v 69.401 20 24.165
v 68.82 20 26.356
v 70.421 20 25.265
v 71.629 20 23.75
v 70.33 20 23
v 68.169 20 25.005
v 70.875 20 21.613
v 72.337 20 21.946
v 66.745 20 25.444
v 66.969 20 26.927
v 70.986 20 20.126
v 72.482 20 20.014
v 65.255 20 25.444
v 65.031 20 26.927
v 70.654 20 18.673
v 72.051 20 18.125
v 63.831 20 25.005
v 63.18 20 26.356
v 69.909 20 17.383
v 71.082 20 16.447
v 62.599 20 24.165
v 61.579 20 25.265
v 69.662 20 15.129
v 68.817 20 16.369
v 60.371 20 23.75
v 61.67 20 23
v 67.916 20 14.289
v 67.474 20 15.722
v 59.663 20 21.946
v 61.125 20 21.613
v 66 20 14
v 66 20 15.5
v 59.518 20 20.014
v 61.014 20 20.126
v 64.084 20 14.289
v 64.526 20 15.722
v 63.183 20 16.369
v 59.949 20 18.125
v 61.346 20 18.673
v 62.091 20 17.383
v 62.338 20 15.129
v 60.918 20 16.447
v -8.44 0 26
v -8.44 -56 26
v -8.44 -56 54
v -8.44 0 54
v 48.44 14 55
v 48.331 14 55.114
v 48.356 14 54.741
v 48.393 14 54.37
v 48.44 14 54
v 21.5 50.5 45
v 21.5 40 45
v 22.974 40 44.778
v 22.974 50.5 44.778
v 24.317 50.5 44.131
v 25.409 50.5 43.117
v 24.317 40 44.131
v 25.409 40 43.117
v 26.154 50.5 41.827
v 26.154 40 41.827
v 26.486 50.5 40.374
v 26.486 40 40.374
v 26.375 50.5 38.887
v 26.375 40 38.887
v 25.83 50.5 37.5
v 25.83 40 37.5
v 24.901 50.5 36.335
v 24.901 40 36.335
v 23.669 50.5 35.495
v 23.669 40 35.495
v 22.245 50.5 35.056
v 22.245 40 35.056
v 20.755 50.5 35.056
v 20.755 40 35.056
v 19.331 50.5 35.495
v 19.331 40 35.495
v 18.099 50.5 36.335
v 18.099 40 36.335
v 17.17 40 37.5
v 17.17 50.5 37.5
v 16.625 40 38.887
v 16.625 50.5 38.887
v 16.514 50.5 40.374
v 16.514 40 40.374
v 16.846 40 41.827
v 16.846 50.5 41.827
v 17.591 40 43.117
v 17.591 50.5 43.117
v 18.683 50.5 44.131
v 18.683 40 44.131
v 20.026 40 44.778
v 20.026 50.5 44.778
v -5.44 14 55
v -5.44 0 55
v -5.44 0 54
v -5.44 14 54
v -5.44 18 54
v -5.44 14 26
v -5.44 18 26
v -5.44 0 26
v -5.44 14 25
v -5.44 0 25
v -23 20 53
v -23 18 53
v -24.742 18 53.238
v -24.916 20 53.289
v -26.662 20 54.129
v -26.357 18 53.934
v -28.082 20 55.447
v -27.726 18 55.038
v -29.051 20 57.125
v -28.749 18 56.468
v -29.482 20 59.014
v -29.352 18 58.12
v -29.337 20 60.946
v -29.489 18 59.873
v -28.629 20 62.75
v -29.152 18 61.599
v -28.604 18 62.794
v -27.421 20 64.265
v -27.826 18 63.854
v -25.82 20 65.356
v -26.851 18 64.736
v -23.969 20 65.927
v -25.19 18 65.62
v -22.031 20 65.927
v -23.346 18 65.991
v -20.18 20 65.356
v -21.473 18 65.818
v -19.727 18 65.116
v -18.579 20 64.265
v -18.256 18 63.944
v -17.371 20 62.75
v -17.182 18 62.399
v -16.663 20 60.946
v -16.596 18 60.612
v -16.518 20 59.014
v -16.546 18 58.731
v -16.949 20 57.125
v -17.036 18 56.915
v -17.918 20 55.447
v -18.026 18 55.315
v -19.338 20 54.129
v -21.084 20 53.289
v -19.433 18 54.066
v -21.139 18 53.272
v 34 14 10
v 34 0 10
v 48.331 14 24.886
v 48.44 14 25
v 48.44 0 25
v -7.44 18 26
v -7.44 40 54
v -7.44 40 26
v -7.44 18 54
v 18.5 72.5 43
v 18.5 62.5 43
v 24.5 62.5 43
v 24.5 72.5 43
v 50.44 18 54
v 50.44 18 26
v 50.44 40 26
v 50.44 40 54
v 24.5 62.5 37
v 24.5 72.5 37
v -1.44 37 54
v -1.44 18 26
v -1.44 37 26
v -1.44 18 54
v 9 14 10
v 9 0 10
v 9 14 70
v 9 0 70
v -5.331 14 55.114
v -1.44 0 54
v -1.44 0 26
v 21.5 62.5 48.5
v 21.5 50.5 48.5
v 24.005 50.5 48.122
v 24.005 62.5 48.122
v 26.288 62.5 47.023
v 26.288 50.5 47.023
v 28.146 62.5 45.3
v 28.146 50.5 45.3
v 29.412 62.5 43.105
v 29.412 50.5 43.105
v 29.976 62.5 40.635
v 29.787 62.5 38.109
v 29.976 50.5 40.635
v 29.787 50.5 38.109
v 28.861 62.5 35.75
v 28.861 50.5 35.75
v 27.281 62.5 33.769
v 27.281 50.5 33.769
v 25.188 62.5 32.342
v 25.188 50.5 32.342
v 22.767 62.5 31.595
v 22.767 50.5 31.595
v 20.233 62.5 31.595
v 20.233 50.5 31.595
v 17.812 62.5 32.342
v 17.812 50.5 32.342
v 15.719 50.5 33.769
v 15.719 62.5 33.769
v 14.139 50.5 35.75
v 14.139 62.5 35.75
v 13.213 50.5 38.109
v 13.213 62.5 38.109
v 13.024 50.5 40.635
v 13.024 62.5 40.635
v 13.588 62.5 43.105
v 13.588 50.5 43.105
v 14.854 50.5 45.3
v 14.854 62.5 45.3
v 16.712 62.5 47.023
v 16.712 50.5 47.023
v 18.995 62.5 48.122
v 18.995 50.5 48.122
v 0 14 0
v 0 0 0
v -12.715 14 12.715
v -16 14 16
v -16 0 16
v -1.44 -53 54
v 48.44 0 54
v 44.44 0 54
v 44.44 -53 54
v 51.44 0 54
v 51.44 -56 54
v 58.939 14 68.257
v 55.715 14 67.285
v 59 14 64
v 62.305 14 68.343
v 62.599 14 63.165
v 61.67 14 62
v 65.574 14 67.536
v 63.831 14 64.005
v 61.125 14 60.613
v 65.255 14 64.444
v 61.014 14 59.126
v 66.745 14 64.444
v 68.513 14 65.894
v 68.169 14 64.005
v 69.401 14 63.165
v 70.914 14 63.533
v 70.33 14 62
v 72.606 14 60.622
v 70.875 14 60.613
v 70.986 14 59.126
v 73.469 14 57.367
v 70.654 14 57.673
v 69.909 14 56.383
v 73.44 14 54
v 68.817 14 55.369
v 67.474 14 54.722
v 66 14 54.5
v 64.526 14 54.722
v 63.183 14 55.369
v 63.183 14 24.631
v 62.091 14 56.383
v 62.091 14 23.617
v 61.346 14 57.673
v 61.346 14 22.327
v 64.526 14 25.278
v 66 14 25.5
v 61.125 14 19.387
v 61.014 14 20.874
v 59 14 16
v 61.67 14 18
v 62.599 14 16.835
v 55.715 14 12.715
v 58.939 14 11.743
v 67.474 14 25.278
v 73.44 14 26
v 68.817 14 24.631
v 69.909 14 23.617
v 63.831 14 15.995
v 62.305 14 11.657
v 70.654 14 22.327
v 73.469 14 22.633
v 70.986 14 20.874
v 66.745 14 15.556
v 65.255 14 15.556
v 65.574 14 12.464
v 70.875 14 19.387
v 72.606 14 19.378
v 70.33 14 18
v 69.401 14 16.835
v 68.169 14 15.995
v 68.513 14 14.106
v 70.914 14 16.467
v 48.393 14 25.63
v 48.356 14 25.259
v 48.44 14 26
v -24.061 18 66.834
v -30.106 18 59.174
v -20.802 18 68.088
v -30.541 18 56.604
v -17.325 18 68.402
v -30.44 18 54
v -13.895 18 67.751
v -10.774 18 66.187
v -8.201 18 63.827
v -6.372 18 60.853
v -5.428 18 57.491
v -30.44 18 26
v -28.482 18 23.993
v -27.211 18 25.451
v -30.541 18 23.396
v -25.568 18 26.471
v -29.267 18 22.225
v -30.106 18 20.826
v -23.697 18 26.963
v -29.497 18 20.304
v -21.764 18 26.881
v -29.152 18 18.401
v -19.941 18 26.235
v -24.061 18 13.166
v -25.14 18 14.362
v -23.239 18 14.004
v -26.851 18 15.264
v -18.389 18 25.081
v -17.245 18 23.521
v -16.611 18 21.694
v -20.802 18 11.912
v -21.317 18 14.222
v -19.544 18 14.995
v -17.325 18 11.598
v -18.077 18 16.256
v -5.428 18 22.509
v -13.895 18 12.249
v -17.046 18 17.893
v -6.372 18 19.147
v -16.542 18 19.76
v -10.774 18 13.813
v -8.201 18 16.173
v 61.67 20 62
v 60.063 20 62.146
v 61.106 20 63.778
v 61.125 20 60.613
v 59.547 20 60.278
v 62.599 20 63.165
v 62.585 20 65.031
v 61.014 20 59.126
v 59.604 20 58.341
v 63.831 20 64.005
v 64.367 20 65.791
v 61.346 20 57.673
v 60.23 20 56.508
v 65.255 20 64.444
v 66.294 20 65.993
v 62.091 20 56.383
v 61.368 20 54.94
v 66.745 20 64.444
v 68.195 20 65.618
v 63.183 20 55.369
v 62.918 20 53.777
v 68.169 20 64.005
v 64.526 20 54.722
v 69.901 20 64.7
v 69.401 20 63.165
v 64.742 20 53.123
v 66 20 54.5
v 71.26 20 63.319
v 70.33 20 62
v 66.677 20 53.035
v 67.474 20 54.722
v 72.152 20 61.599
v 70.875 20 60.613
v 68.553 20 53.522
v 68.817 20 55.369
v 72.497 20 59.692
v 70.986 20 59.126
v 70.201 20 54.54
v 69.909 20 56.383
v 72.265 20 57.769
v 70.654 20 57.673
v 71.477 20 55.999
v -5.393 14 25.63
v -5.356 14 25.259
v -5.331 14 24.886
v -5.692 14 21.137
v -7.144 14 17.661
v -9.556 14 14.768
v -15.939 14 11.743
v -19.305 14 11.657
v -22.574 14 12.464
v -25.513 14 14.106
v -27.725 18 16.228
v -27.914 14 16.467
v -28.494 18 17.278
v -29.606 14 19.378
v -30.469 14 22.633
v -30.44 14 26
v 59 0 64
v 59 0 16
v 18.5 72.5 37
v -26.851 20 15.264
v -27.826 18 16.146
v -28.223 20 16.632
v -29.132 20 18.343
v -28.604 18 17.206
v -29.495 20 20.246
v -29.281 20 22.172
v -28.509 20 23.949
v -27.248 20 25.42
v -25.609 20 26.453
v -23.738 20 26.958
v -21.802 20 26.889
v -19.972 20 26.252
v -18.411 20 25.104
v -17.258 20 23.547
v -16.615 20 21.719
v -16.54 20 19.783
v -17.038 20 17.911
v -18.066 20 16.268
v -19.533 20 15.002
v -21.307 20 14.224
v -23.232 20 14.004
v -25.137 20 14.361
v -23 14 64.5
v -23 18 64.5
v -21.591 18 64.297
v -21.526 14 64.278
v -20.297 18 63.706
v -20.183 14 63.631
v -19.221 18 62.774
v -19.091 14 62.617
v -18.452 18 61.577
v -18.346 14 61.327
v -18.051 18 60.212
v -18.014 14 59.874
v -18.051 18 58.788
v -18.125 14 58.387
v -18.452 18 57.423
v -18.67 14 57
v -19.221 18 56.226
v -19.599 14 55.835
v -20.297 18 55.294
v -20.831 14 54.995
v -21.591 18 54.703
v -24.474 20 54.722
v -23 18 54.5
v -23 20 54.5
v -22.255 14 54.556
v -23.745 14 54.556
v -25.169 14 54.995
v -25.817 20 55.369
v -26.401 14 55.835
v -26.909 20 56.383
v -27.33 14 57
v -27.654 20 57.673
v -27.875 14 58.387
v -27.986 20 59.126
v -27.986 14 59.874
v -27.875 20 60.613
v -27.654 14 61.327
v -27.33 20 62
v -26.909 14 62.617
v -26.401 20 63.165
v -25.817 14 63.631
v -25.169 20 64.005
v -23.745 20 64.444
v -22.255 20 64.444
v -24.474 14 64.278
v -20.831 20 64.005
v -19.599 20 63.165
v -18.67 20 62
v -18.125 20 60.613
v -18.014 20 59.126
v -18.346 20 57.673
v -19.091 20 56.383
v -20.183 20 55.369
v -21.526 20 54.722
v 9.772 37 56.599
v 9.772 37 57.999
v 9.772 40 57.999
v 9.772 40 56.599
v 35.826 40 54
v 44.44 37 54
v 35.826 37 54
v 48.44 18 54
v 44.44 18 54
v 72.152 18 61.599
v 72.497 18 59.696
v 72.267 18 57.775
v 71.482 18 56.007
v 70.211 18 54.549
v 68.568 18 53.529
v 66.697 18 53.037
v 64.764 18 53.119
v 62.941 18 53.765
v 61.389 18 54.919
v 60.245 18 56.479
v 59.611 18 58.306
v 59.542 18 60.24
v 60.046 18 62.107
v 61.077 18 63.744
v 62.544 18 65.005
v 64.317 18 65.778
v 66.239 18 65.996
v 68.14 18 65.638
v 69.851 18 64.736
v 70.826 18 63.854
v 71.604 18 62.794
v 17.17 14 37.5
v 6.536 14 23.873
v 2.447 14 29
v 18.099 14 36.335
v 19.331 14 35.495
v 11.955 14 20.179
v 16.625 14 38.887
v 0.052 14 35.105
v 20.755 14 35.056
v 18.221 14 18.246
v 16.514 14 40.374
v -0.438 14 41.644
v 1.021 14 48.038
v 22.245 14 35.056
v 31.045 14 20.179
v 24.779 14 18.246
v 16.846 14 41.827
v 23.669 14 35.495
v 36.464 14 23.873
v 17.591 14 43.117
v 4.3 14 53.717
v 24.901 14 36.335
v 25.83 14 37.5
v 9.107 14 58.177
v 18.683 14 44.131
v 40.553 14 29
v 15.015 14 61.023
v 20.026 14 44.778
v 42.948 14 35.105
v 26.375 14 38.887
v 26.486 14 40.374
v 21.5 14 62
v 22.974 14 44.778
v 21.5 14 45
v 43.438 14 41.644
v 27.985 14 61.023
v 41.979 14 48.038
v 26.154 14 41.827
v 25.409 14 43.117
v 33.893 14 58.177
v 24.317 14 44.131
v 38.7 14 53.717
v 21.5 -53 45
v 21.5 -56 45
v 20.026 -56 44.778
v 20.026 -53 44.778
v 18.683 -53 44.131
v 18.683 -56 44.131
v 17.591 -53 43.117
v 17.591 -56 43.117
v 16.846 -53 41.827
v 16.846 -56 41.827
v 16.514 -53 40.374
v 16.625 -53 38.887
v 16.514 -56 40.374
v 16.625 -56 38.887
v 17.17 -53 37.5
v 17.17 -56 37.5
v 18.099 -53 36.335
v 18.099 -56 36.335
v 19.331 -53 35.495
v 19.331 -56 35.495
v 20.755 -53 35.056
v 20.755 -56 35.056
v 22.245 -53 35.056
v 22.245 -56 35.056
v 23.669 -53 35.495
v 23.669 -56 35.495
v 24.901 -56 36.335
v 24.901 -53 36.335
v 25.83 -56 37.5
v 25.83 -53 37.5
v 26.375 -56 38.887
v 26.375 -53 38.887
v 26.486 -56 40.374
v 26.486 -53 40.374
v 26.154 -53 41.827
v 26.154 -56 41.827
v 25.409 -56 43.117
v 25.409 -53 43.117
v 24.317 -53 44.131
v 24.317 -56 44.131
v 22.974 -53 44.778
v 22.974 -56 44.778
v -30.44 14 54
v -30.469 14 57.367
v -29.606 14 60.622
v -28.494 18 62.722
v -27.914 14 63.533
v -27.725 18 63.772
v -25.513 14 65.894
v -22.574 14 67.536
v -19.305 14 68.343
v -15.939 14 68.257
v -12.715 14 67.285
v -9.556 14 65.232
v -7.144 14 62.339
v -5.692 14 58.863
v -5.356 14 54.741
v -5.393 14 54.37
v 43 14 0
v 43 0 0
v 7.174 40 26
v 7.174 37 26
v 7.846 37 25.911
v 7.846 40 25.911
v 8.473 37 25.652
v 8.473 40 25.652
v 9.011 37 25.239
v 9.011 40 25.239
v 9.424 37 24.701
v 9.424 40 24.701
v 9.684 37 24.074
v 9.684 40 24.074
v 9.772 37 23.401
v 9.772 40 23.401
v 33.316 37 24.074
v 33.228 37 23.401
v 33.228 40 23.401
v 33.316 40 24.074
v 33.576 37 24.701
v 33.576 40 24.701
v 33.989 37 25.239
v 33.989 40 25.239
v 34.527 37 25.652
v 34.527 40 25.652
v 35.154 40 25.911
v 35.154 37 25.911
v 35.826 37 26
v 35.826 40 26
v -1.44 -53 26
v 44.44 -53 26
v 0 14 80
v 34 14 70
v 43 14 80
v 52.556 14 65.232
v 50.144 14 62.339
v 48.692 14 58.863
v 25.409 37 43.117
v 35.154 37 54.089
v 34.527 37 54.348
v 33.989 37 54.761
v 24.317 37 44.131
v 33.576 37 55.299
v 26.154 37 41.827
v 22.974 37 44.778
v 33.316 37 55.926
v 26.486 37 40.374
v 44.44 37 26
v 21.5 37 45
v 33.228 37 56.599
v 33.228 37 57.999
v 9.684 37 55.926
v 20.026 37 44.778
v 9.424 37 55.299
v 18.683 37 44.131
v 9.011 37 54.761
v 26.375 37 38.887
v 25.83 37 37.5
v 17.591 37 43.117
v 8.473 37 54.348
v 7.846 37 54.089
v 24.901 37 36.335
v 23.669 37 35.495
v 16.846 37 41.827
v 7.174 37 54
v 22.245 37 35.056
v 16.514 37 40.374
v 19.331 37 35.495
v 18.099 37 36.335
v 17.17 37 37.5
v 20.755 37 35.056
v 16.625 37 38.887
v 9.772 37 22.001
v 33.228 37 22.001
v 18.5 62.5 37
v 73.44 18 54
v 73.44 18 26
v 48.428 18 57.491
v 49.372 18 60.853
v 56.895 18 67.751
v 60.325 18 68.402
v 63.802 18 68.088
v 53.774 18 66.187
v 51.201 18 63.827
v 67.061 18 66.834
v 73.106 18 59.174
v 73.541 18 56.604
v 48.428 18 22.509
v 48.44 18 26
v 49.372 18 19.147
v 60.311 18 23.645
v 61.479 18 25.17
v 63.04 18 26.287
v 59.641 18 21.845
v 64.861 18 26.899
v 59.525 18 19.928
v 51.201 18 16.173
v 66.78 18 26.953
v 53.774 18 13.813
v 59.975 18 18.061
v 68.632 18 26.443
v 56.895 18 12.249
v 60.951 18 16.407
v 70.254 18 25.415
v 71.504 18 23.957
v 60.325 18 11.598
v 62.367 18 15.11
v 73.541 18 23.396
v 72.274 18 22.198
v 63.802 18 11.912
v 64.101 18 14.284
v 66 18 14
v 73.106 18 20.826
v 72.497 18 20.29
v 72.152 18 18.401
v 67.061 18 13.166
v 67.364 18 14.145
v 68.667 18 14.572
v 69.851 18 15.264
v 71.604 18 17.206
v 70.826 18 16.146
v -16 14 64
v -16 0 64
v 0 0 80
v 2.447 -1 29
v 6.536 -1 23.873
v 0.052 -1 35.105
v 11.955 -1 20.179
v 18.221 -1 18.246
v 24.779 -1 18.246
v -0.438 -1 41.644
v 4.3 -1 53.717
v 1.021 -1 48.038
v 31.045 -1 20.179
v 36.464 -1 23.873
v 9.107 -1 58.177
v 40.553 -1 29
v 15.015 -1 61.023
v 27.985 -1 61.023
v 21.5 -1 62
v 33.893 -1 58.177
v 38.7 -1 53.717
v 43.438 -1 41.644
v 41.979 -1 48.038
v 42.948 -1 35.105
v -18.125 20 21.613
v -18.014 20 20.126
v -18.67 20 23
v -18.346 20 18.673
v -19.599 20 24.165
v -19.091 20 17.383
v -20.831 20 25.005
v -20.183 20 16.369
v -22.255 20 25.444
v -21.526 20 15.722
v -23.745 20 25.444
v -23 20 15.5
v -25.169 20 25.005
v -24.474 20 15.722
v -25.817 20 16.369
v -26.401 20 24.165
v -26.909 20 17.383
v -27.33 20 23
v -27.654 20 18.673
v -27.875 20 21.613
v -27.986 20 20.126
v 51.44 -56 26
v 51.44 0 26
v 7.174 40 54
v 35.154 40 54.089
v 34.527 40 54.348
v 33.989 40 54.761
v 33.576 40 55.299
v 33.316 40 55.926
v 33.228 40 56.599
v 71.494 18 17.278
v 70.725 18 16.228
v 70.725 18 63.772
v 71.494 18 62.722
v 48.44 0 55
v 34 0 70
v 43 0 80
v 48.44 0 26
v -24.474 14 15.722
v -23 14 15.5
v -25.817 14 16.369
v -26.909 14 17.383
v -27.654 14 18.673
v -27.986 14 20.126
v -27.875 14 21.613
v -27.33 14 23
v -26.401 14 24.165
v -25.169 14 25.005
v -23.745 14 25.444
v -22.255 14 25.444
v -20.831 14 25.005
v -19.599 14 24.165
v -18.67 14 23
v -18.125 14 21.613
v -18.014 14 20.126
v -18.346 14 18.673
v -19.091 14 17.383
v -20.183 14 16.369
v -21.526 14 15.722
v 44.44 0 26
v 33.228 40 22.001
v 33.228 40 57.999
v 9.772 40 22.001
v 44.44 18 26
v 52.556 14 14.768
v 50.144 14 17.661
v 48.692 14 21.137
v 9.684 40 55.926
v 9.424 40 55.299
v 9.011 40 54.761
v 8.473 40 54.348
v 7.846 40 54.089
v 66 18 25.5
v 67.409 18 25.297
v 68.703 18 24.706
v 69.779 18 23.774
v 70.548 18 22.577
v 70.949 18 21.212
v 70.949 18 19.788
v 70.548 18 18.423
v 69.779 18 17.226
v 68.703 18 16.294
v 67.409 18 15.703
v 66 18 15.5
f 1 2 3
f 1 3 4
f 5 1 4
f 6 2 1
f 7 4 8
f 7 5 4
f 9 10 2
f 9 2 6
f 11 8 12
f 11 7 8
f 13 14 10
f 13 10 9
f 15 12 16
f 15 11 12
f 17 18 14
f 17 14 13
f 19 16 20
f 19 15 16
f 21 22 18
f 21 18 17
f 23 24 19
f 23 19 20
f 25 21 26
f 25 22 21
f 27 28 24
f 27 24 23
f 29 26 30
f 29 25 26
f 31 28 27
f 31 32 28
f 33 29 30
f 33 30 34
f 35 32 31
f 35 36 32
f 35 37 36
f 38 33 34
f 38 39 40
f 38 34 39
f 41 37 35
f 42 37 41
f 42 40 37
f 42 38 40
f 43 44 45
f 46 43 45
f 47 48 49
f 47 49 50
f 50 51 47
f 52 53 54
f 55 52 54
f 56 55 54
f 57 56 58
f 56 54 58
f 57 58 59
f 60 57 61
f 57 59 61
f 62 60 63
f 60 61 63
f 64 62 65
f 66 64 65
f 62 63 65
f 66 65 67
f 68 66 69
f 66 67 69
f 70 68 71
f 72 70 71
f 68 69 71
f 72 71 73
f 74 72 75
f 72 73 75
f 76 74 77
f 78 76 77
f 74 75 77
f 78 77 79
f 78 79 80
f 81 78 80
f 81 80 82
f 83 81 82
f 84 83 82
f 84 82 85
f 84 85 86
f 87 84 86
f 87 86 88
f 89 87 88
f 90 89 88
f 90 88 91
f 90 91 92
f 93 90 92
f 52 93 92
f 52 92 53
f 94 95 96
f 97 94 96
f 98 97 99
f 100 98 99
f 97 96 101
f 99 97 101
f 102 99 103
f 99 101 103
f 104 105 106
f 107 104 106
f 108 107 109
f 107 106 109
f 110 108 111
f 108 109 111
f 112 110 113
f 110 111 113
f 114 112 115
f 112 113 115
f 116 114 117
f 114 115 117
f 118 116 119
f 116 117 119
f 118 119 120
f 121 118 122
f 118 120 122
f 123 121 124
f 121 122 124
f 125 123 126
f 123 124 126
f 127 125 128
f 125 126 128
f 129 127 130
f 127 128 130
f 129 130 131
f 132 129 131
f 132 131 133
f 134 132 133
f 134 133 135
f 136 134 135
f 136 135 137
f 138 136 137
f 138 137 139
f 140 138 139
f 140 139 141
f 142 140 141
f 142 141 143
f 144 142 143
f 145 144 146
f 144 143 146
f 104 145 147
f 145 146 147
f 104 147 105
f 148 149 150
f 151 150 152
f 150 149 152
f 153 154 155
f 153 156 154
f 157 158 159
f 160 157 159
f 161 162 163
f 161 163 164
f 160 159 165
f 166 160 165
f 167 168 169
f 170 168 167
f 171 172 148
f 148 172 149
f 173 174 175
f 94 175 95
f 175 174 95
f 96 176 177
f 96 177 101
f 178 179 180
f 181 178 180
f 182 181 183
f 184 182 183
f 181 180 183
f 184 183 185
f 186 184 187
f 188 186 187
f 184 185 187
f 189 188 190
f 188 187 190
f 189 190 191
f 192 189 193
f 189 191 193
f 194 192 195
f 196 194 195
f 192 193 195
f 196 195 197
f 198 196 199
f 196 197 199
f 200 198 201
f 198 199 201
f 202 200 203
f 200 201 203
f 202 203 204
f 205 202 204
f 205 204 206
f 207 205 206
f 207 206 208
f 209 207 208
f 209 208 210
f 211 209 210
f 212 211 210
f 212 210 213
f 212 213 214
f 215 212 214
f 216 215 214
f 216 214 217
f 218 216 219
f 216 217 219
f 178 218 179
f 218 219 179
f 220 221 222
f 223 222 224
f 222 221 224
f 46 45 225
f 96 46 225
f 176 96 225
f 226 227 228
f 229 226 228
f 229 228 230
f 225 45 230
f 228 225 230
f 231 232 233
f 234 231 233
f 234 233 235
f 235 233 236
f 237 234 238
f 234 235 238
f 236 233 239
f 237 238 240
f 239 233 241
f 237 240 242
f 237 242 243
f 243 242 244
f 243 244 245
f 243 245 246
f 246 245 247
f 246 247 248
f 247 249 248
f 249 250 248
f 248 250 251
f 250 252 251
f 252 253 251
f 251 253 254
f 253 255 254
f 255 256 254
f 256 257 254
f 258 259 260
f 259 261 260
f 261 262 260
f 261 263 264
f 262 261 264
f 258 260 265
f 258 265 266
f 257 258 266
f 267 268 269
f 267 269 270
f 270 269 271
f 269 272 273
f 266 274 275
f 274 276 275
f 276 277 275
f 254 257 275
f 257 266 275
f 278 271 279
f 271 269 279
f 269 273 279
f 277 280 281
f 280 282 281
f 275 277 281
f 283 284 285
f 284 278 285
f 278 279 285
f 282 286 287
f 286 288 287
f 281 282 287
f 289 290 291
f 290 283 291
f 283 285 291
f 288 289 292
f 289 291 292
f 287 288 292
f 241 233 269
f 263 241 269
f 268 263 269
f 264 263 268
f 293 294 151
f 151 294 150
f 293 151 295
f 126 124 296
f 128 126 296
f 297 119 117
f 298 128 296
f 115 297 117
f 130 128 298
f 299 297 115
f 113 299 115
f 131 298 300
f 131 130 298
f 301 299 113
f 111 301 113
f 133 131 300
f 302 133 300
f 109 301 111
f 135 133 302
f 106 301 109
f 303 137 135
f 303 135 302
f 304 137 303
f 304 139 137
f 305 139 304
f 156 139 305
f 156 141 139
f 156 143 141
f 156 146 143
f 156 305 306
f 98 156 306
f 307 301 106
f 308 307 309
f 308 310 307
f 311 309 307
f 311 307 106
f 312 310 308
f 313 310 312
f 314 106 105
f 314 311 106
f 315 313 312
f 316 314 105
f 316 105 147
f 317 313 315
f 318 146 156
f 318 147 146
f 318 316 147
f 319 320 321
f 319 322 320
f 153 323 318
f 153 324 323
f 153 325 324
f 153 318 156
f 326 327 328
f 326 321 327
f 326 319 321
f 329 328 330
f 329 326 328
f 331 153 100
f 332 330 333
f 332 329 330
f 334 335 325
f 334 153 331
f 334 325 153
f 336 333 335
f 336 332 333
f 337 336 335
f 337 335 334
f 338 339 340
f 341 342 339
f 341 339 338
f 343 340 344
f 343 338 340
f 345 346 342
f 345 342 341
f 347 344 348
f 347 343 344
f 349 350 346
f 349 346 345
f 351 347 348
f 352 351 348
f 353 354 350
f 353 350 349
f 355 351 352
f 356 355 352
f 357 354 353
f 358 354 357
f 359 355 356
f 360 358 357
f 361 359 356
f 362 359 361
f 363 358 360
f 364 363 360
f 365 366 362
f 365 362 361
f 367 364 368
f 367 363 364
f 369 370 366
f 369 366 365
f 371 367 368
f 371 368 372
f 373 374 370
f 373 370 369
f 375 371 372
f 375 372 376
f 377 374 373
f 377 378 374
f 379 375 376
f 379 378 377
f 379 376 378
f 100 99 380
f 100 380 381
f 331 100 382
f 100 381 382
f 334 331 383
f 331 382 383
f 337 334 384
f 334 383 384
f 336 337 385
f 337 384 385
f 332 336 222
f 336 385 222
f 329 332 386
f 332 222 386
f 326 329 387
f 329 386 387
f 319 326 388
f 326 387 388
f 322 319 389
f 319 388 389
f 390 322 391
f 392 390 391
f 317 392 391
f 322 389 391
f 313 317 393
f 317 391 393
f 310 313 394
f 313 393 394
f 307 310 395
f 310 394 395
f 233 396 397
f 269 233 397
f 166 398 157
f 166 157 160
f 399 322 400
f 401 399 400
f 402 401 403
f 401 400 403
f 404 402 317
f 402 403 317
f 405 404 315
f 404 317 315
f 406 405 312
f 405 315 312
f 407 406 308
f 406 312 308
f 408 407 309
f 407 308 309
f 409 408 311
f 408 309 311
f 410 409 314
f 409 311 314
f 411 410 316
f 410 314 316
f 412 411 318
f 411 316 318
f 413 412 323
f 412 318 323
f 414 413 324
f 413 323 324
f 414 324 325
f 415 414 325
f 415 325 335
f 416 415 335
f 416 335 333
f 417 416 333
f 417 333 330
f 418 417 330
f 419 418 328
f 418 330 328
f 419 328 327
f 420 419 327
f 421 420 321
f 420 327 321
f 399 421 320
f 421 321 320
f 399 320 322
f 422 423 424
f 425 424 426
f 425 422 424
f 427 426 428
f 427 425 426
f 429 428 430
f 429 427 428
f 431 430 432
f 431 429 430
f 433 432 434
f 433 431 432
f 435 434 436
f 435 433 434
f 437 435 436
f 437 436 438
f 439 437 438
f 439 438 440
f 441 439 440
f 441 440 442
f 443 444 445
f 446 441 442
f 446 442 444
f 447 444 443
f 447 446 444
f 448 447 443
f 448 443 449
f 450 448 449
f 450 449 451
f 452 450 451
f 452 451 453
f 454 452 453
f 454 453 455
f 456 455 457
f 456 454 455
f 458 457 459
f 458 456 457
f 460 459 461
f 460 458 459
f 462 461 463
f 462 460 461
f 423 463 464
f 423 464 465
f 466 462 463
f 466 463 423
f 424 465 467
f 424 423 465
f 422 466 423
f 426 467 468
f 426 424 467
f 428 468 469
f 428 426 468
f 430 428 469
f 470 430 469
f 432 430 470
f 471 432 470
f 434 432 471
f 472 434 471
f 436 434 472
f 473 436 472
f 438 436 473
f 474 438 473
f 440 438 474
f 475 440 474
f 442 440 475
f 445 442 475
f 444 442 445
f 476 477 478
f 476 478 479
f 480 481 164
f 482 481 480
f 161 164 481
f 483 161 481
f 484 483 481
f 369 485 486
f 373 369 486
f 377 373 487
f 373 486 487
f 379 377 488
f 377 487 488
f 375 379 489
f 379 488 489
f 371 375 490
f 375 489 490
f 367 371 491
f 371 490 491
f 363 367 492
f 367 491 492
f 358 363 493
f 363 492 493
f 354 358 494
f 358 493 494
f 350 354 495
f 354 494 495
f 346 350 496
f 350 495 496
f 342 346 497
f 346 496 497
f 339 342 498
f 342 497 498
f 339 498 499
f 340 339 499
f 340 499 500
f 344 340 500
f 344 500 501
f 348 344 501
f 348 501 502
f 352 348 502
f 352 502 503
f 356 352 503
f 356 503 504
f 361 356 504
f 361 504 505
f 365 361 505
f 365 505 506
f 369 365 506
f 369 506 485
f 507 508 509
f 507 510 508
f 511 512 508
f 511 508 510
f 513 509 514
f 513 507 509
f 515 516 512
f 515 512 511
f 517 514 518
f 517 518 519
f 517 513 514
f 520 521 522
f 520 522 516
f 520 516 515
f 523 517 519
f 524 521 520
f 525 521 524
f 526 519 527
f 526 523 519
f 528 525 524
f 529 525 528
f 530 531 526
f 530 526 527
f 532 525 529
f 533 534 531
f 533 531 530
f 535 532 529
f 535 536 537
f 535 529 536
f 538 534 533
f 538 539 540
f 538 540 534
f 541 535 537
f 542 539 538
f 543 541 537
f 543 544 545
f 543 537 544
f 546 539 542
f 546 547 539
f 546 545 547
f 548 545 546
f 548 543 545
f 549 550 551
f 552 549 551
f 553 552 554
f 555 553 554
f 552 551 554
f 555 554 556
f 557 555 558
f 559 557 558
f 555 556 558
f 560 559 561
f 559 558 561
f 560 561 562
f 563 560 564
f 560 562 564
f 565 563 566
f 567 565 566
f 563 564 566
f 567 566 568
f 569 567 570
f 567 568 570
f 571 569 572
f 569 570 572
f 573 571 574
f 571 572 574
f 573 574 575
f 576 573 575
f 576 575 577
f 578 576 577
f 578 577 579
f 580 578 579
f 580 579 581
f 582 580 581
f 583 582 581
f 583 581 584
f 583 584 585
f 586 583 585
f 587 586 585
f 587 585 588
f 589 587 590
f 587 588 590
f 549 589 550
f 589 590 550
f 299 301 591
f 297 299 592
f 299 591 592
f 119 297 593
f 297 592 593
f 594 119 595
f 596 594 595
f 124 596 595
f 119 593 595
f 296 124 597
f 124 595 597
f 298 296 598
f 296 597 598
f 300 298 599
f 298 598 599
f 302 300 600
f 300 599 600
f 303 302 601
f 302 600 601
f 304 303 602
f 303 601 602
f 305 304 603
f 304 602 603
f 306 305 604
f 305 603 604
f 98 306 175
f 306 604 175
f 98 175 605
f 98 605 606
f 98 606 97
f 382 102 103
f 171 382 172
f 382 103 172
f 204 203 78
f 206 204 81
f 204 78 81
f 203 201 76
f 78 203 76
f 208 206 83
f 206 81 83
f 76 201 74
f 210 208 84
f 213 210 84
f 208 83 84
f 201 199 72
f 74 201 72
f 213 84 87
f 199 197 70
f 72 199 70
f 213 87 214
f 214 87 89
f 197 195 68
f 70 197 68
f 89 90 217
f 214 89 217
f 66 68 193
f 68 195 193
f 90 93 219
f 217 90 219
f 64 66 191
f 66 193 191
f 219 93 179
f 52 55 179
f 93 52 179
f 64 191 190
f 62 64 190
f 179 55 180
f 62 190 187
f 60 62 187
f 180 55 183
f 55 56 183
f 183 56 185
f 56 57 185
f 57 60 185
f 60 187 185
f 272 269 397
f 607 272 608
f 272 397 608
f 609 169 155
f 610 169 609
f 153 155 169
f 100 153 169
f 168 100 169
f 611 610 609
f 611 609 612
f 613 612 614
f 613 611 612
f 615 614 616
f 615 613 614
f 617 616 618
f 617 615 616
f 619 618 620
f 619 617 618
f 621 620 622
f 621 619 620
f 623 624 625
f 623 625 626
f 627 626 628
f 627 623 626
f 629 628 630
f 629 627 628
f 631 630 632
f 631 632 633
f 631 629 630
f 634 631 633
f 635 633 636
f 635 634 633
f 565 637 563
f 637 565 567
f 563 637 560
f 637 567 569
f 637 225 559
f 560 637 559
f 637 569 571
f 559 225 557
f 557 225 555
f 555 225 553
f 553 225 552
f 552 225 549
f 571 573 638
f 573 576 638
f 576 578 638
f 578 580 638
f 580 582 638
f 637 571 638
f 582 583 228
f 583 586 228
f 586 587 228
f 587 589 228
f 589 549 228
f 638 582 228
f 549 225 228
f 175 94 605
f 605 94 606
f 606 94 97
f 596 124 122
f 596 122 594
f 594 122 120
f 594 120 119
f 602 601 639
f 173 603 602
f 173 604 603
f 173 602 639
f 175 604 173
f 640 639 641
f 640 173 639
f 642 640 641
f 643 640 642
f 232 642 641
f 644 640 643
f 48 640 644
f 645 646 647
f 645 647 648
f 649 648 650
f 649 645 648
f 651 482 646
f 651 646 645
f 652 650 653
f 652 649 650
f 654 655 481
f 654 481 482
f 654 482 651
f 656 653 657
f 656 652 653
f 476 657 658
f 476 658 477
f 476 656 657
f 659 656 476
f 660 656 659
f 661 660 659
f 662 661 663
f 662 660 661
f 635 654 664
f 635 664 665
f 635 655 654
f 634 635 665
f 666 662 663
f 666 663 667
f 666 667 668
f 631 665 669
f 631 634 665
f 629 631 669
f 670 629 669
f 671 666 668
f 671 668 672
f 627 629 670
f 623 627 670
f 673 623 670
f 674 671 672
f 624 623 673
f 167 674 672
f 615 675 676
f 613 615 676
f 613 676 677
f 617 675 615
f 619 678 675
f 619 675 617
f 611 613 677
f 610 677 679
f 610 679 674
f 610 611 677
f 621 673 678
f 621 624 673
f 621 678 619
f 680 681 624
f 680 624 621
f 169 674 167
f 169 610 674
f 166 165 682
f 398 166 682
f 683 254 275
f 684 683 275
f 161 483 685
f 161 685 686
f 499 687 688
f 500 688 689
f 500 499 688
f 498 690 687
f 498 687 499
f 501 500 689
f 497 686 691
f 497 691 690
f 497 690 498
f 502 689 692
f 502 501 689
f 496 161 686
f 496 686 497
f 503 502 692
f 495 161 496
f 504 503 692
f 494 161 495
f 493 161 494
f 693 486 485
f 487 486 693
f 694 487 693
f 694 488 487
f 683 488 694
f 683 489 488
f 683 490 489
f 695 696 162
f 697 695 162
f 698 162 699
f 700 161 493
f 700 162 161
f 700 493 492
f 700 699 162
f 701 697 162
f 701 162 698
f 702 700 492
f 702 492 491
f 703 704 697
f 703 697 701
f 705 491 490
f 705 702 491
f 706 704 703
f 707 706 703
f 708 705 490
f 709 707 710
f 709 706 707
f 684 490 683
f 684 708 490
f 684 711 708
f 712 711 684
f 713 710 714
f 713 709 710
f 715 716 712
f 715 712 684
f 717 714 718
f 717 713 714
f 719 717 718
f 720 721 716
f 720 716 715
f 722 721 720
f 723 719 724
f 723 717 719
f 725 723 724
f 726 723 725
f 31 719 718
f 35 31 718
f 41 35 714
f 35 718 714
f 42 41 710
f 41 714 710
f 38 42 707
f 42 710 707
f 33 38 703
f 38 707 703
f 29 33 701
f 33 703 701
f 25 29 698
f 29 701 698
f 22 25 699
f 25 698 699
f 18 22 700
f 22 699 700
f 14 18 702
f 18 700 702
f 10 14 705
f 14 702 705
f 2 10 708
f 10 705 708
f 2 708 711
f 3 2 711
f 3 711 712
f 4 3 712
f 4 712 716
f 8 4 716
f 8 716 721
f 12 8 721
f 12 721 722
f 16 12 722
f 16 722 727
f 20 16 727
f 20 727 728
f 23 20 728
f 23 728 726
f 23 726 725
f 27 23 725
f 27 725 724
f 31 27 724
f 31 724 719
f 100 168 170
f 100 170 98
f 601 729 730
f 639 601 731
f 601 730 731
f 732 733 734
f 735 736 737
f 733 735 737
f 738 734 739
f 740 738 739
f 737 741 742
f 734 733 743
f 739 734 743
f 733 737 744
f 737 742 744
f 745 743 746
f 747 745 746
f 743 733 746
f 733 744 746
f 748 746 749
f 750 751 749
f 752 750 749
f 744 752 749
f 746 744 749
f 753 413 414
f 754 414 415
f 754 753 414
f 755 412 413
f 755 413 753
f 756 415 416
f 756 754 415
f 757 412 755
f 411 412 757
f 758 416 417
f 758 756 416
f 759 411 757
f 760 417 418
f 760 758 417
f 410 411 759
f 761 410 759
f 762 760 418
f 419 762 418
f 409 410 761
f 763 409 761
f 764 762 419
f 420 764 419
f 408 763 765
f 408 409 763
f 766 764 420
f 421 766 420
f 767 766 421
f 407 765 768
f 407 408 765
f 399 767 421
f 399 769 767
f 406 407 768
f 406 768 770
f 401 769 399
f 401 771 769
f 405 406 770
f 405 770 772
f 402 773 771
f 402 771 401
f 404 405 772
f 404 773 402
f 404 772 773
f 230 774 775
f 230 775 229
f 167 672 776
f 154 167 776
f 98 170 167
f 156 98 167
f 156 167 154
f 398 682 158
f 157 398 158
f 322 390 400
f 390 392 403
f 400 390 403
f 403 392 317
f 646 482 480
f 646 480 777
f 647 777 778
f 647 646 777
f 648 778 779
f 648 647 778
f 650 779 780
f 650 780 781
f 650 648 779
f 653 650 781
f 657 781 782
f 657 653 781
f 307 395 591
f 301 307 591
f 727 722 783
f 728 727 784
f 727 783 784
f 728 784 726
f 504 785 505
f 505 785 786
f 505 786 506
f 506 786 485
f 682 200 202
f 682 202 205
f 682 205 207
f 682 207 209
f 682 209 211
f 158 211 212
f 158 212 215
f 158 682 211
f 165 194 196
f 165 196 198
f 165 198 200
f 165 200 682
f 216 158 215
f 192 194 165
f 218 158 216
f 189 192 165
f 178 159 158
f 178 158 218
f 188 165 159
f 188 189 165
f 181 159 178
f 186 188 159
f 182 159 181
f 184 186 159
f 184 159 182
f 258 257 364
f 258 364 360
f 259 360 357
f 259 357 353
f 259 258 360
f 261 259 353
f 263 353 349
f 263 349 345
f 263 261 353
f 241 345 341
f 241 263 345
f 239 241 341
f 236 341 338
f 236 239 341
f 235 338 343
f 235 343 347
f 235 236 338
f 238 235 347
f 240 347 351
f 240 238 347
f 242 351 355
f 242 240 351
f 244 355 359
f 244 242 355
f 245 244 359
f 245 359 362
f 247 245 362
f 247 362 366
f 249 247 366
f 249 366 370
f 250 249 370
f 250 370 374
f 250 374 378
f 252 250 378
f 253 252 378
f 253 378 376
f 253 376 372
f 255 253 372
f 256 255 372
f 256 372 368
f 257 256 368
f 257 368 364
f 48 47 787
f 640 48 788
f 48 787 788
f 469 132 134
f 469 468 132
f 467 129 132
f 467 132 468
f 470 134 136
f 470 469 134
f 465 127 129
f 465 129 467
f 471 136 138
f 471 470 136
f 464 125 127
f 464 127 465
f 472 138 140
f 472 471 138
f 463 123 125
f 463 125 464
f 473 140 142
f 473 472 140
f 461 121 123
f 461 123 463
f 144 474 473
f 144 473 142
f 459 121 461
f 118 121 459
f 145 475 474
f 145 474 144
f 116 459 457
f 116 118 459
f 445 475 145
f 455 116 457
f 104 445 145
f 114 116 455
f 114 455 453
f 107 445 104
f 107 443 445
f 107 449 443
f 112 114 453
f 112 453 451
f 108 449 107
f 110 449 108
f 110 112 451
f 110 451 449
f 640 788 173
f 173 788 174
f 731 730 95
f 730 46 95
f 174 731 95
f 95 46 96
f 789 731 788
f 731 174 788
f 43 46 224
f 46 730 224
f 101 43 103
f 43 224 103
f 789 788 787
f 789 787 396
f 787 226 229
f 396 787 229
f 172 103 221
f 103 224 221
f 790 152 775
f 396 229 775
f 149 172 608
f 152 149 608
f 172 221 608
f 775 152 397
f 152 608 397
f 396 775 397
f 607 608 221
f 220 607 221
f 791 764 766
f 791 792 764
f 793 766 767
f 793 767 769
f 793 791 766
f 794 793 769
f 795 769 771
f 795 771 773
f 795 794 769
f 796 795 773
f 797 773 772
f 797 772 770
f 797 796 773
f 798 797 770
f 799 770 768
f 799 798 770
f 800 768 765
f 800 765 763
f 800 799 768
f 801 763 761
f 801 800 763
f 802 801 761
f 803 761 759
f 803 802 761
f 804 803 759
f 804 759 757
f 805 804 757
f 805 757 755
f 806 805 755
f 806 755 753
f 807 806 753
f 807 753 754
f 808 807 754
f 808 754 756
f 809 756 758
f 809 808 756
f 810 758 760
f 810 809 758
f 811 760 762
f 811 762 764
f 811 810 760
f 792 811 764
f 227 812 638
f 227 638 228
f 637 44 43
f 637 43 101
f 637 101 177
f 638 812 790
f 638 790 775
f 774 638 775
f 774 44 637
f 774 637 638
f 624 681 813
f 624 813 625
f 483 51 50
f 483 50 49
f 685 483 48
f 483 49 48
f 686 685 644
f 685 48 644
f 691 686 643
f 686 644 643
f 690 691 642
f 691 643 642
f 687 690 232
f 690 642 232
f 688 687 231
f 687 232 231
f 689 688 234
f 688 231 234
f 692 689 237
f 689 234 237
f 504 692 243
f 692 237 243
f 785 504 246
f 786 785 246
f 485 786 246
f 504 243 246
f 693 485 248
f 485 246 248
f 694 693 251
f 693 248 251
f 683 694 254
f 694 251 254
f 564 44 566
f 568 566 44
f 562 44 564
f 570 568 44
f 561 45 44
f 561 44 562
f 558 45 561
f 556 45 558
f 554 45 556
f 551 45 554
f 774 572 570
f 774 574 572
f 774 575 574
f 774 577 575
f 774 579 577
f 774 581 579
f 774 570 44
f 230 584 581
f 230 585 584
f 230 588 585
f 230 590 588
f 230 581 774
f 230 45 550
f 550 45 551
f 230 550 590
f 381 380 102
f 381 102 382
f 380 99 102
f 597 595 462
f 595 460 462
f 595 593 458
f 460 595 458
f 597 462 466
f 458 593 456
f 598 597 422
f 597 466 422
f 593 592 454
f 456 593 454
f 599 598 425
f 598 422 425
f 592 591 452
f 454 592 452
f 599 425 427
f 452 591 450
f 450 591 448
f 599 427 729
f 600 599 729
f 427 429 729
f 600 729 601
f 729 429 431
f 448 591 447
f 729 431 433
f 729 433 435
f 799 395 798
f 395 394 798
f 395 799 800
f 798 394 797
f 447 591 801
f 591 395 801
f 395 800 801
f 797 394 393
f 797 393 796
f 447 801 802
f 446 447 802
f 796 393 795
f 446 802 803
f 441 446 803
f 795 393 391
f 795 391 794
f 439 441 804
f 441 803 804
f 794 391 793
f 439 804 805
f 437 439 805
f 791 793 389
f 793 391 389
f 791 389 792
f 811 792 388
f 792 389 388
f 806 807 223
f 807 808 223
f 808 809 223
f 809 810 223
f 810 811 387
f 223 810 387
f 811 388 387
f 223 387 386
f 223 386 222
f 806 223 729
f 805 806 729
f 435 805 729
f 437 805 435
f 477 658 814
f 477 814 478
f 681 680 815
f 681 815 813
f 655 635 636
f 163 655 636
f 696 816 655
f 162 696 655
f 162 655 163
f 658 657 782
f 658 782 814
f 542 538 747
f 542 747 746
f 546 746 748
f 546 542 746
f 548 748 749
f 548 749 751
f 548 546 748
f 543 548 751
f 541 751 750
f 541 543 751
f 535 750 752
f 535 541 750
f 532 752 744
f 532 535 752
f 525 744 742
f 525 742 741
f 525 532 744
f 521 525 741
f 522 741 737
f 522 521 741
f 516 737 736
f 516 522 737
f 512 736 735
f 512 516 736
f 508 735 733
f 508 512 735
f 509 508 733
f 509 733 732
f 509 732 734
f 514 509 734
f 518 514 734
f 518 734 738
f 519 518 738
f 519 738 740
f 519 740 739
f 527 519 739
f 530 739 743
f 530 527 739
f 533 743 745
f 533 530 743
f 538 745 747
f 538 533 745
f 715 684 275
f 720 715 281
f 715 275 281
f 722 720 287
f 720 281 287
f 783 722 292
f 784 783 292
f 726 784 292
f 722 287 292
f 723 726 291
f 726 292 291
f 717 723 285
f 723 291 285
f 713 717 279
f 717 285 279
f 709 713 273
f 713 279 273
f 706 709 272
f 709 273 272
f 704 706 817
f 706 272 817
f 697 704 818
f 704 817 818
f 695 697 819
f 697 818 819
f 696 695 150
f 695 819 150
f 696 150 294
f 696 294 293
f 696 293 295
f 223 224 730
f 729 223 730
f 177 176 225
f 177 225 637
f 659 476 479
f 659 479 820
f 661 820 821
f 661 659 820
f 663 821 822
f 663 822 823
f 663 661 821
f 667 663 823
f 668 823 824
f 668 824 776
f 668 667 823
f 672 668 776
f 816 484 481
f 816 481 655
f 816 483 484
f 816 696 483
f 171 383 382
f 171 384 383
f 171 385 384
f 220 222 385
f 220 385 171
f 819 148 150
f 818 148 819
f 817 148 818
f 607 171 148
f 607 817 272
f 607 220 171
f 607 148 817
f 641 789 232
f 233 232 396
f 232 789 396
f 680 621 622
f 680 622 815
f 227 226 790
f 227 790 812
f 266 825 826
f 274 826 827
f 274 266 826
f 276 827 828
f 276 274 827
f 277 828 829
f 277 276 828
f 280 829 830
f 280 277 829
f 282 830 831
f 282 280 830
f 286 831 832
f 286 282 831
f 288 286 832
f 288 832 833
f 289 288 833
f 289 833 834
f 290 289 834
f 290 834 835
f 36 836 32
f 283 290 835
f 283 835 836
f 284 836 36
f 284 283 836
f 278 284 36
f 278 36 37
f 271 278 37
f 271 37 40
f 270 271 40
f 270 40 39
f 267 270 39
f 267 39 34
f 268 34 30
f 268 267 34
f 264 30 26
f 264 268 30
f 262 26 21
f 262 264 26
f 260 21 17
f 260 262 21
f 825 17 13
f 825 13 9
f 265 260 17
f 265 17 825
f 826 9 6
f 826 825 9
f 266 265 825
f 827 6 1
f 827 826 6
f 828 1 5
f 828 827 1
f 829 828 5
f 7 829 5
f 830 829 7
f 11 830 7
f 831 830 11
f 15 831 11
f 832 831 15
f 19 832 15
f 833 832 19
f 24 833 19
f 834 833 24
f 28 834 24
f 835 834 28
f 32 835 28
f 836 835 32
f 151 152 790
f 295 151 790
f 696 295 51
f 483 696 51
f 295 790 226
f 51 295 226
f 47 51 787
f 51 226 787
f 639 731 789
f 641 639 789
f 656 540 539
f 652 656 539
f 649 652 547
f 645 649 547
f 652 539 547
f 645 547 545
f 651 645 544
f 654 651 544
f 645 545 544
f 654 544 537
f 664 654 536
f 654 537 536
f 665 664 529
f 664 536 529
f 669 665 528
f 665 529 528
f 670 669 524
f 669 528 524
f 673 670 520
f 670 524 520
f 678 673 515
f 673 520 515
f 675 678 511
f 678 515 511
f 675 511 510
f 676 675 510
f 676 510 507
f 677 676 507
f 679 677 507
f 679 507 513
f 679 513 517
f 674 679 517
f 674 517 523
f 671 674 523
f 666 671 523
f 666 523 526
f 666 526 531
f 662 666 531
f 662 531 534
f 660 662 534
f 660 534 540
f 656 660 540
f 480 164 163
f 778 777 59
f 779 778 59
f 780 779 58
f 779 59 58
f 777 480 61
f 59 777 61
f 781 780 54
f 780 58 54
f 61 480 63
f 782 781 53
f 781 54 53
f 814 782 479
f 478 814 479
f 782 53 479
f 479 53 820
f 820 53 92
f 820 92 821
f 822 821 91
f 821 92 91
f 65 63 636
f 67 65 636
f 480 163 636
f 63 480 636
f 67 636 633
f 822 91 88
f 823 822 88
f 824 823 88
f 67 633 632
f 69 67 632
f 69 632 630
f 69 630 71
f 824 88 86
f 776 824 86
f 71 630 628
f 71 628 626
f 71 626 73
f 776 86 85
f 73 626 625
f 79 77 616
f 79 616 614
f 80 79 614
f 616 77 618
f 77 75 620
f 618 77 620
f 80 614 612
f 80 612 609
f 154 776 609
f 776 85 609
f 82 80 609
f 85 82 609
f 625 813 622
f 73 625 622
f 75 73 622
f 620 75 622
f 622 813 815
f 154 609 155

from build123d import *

# Parameters (mm, degrees)
SALIENTE_EXTRUIR1_DEPTH  = 14
CROQUIS4_R               = 22
SALIENTE_EXTRUIR2_DEPTH  = 15
CROQUIS5_R               = 5
SALIENTE_EXTRUIR3_DEPTH  = 4
CROQUIS7_R               = 6.5
CROQUIS7_R_2             = 5
SALIENTE_EXTRUIR4_DEPTH  = 2
SALIENTE_EXTRUIR5_DEPTH  = 19
CROQUIS9_R               = 5
SALIENTE_EXTRUIR6_DEPTH  = 3
CROQUIS10_R              = 5
SALIENTE_EXTRUIR7_DEPTH  = 36.5
CROQUIS12_R              = 8.5
SALIENTE_EXTRUIR8_DEPTH  = 12
SALIENTE_EXTRUIR9_DEPTH  = 53
SALIENTE_EXTRUIR10_START = 3
CROQUIS14_W              = 59.880061862
CROQUIS14_H              = 28
CROQUIS14_R              = 5
SALIENTE_EXTRUIR10_DEPTH = 3
SALIENTE_EXTRUIR11_DEPTH = 10


with BuildPart() as part:
    # Croquis2 → Saliente-Extruir1 (new body)
    with BuildSketch(Plane(origin=(0, 0, 0), x_dir=(1, 0, 0), z_dir=(0, 1, 0))):
        Polygon((43, 0), (0, 0), (-16, -16), (-16, -64), (0, -80), (21.5, -80), (43, -80), (59, -64), (59, -16), align=None)
        Polygon((48.440030931, -25), (48.440030931, -55), (34, -70), (9, -70), (-5.440030931, -55), (-5.440030931, -25), (9, -10), (34, -10), align=None, mode=Mode.SUBTRACT)
    extrude(amount=SALIENTE_EXTRUIR1_DEPTH)

    # Croquis5 → Saliente-Extruir3 (add)
    # profile 1 of 2: a face of its own
    with BuildSketch(Plane(origin=(0, 14, 0), x_dir=(1, 0, 0), z_dir=(0, 1, 0))):
        with BuildLine():
            Line((-30.440030931, -26), (-30.440030931, -54))
            ThreePointArc((-30.440030931, -54), (-17.940030931, -68.416978851), (-5.440030931, -54))
            Line((-5.440030931, -54), (-5.440030931, -26))
            ThreePointArc((-5.440030931, -26), (-17.940030931, -11.583021149), (-30.440030931, -26))
        make_face()
        with Locations(Location((-23, -59.5, 0), (0, 0, 270))):
            Circle(CROQUIS5_R, mode=Mode.SUBTRACT)
        with Locations(Location((-23, -20.5, 0), (0, 0, 90))):
            Circle(CROQUIS5_R, mode=Mode.SUBTRACT)
    # profile 2 of 2: a face of its own
    with BuildSketch(Plane(origin=(0, 14, 0), x_dir=(1, 0, 0), z_dir=(0, 1, 0))):
        with BuildLine():
            Line((48.440030931, -26), (48.440030931, -54))
            ThreePointArc((48.440030931, -54), (60.940030931, -68.416978851), (73.440030931, -54))
            Line((73.440030931, -54), (73.440030931, -26))
            ThreePointArc((73.440030931, -26), (60.940030931, -11.583021149), (48.440030931, -26))
        make_face()
        with Locations(Location((66, -20.5, 0), (0, 0, 270))):
            Circle(CROQUIS5_R, mode=Mode.SUBTRACT)
        with Locations(Location((66, -59.5, 0), (0, 0, 90))):
            Circle(CROQUIS5_R, mode=Mode.SUBTRACT)
    extrude(amount=SALIENTE_EXTRUIR3_DEPTH)

    # Croquis7 → Saliente-Extruir4 (add)
    # profile 1 of 4: a face of its own
    with BuildSketch(Plane(origin=(0, 18, 0), x_dir=(1, 0, 0), z_dir=(0, 1, 0))):
        with Locations(Location((-23, -20.5, 0), (0, 0, 126.333634549))):
            Circle(CROQUIS7_R)
        with Locations(Location((-23, -20.5, 0), (0, 0, 90))):
            Circle(CROQUIS7_R_2, mode=Mode.SUBTRACT)
    # profile 2 of 4: a face of its own
    with BuildSketch(Plane(origin=(0, 18, 0), x_dir=(1, 0, 0), z_dir=(0, 1, 0))):
        with Locations(Location((-23, -59.5, 0), (0, 0, 90))):
            Circle(CROQUIS7_R)
        with Locations(Location((-23, -59.5, 0), (0, 0, 90))):
            Circle(CROQUIS7_R_2, mode=Mode.SUBTRACT)
    # profile 3 of 4: a face of its own
    with BuildSketch(Plane(origin=(0, 18, 0), x_dir=(1, 0, 0), z_dir=(0, 1, 0))):
        with Locations(Location((66, -59.5, 0), (0, 0, 341.1612762))):
            Circle(CROQUIS7_R)
        with Locations(Location((66, -59.5, 0), (0, 0, 90))):
            Circle(CROQUIS7_R_2, mode=Mode.SUBTRACT)
    # profile 4 of 4: a face of its own
    with BuildSketch(Plane(origin=(0, 18, 0), x_dir=(1, 0, 0), z_dir=(0, 1, 0))):
        with Locations(Location((66, -20.5, 0), (0, 0, 90))):
            Circle(CROQUIS7_R)
        with Locations(Location((66, -20.5, 0), (0, 0, 90))):
            Circle(CROQUIS7_R_2, mode=Mode.SUBTRACT)
    extrude(amount=SALIENTE_EXTRUIR4_DEPTH)

    # Croquis8 → Saliente-Extruir5 (add)
    with BuildSketch(Plane(origin=(0, 18, 0), x_dir=(1, 0, 0), z_dir=(0, 1, 0))):
        Polygon((-5.440030931, -26), (-1.440030931, -26), (-1.440030931, -54), (-5.440030931, -54), (-7.440030931, -54), (-7.440030931, -26), align=None)
        Polygon((50.440030931, -54), (48.440030931, -54), (44.440030931, -54), (44.440030931, -26), (48.440030931, -26), (50.440030931, -26), align=None)
    extrude(amount=SALIENTE_EXTRUIR5_DEPTH)

    # Croquis9 → Saliente-Extruir6 (add)
    with BuildSketch(Plane(origin=(0, 37, 0), x_dir=(1, 0, 0), z_dir=(0, 1, 0))):
        with BuildLine():
            Line((-7.440030931, -26), (7.17351898, -26))
            ThreePointArc((7.17351898, -26), (9.011002532, -25.238889392), (9.77211314, -23.40140584))
            Line((9.77211314, -23.40140584), (9.77211314, -22.000951417))
            Line((9.77211314, -22.000951417), (33.22788686, -22.000951417))
            Line((33.22788686, -22.000951417), (33.22788686, -23.40140584))
            ThreePointArc((33.22788686, -23.40140584), (33.988997468, -25.238889392), (35.82648102, -26))
            Line((35.82648102, -26), (50.440030931, -26))
            Line((50.440030931, -26), (50.440030931, -54))
            Line((50.440030931, -54), (35.82648102, -54))
            ThreePointArc((35.82648102, -54), (33.988997468, -54.761110608), (33.22788686, -56.59859416))
            Line((33.22788686, -56.59859416), (33.22788686, -57.999048583))
            Line((33.22788686, -57.999048583), (9.77211314, -57.999048583))
            Line((9.77211314, -57.999048583), (9.77211314, -56.59859416))
            ThreePointArc((9.77211314, -56.59859416), (9.011002532, -54.761110608), (7.17351898, -54))
            Line((7.17351898, -54), (-7.440030931, -54))
            Line((-7.440030931, -54), (-7.440030931, -26))
        make_face()
        with Locations(Location((21.5, -40, 0), (0, 0, 270))):
            Circle(CROQUIS9_R, mode=Mode.SUBTRACT)
    extrude(amount=SALIENTE_EXTRUIR6_DEPTH)



with BuildPart() as body_2:
    # Croquis4 → Saliente-Extruir2 (new body)
    with BuildSketch(Plane(origin=(0, 14, 0), x_dir=(1, 0, 0), z_dir=(0, 1, 0))):
        with Locations(Location((21.5, -40, 0), (0, 0, 270))):
            Circle(CROQUIS4_R)
    extrude(amount=-SALIENTE_EXTRUIR2_DEPTH)


with BuildPart() as part_1:
    add(part.part)

    add(body_2.part)  # Saliente-Extruir7 merges body 2
    # Croquis10 → Saliente-Extruir7 (add)
    with BuildSketch(Plane(origin=(0, 14, 0), x_dir=(1, 0, 0), z_dir=(0, 1, 0))):
        with Locations(Location((21.5, -40, 0), (0, 0, 270))):
            Circle(CROQUIS10_R)
    extrude(amount=SALIENTE_EXTRUIR7_DEPTH)

    # Croquis12 → Saliente-Extruir8 (add)
    with BuildSketch(Plane(origin=(0, 50.5, 0), x_dir=(1, 0, 0), z_dir=(0, 1, 0))):
        with Locations(Location((21.5, -40, 0), (0, 0, 270))):
            Circle(CROQUIS12_R)
    extrude(amount=SALIENTE_EXTRUIR8_DEPTH)

    # Croquis13 → Saliente-Extruir9 (add)
    with BuildSketch(Plane.XZ):
        Polygon((-5.440030931, 54), (-1.440030931, 54), (-1.440030931, 26), (-5.440030931, 26), (-8.440030931, 26), (-8.440030931, 54), align=None)
        Polygon((48.440030931, 54), (51.440030931, 54), (51.440030931, 26), (44.440030931, 26), (44.440030931, 54), align=None)
    extrude(amount=SALIENTE_EXTRUIR9_DEPTH)

    # Croquis14 → Saliente-Extruir10 (add)
    with BuildSketch(Plane.XZ.offset(53).offset(SALIENTE_EXTRUIR10_START)):
        with Locations((21.5, 40)):
            Rectangle(CROQUIS14_W, CROQUIS14_H)
        with Locations(Location((21.5, 40, 0), (0, 0, 90))):
            Circle(CROQUIS14_R, mode=Mode.SUBTRACT)
    extrude(amount=-SALIENTE_EXTRUIR10_DEPTH)

    # Croquis15 → Saliente-Extruir11 (add)
    with BuildSketch(Plane(origin=(0, 62.5, 0), x_dir=(1, 0, 0), z_dir=(0, 1, 0))):
        Polygon((21.5, -37), (18.5, -37), (18.5, -43), (24.5, -43), (24.5, -37), align=None)
    extrude(amount=SALIENTE_EXTRUIR11_DEPTH)


solid = part_1.part
